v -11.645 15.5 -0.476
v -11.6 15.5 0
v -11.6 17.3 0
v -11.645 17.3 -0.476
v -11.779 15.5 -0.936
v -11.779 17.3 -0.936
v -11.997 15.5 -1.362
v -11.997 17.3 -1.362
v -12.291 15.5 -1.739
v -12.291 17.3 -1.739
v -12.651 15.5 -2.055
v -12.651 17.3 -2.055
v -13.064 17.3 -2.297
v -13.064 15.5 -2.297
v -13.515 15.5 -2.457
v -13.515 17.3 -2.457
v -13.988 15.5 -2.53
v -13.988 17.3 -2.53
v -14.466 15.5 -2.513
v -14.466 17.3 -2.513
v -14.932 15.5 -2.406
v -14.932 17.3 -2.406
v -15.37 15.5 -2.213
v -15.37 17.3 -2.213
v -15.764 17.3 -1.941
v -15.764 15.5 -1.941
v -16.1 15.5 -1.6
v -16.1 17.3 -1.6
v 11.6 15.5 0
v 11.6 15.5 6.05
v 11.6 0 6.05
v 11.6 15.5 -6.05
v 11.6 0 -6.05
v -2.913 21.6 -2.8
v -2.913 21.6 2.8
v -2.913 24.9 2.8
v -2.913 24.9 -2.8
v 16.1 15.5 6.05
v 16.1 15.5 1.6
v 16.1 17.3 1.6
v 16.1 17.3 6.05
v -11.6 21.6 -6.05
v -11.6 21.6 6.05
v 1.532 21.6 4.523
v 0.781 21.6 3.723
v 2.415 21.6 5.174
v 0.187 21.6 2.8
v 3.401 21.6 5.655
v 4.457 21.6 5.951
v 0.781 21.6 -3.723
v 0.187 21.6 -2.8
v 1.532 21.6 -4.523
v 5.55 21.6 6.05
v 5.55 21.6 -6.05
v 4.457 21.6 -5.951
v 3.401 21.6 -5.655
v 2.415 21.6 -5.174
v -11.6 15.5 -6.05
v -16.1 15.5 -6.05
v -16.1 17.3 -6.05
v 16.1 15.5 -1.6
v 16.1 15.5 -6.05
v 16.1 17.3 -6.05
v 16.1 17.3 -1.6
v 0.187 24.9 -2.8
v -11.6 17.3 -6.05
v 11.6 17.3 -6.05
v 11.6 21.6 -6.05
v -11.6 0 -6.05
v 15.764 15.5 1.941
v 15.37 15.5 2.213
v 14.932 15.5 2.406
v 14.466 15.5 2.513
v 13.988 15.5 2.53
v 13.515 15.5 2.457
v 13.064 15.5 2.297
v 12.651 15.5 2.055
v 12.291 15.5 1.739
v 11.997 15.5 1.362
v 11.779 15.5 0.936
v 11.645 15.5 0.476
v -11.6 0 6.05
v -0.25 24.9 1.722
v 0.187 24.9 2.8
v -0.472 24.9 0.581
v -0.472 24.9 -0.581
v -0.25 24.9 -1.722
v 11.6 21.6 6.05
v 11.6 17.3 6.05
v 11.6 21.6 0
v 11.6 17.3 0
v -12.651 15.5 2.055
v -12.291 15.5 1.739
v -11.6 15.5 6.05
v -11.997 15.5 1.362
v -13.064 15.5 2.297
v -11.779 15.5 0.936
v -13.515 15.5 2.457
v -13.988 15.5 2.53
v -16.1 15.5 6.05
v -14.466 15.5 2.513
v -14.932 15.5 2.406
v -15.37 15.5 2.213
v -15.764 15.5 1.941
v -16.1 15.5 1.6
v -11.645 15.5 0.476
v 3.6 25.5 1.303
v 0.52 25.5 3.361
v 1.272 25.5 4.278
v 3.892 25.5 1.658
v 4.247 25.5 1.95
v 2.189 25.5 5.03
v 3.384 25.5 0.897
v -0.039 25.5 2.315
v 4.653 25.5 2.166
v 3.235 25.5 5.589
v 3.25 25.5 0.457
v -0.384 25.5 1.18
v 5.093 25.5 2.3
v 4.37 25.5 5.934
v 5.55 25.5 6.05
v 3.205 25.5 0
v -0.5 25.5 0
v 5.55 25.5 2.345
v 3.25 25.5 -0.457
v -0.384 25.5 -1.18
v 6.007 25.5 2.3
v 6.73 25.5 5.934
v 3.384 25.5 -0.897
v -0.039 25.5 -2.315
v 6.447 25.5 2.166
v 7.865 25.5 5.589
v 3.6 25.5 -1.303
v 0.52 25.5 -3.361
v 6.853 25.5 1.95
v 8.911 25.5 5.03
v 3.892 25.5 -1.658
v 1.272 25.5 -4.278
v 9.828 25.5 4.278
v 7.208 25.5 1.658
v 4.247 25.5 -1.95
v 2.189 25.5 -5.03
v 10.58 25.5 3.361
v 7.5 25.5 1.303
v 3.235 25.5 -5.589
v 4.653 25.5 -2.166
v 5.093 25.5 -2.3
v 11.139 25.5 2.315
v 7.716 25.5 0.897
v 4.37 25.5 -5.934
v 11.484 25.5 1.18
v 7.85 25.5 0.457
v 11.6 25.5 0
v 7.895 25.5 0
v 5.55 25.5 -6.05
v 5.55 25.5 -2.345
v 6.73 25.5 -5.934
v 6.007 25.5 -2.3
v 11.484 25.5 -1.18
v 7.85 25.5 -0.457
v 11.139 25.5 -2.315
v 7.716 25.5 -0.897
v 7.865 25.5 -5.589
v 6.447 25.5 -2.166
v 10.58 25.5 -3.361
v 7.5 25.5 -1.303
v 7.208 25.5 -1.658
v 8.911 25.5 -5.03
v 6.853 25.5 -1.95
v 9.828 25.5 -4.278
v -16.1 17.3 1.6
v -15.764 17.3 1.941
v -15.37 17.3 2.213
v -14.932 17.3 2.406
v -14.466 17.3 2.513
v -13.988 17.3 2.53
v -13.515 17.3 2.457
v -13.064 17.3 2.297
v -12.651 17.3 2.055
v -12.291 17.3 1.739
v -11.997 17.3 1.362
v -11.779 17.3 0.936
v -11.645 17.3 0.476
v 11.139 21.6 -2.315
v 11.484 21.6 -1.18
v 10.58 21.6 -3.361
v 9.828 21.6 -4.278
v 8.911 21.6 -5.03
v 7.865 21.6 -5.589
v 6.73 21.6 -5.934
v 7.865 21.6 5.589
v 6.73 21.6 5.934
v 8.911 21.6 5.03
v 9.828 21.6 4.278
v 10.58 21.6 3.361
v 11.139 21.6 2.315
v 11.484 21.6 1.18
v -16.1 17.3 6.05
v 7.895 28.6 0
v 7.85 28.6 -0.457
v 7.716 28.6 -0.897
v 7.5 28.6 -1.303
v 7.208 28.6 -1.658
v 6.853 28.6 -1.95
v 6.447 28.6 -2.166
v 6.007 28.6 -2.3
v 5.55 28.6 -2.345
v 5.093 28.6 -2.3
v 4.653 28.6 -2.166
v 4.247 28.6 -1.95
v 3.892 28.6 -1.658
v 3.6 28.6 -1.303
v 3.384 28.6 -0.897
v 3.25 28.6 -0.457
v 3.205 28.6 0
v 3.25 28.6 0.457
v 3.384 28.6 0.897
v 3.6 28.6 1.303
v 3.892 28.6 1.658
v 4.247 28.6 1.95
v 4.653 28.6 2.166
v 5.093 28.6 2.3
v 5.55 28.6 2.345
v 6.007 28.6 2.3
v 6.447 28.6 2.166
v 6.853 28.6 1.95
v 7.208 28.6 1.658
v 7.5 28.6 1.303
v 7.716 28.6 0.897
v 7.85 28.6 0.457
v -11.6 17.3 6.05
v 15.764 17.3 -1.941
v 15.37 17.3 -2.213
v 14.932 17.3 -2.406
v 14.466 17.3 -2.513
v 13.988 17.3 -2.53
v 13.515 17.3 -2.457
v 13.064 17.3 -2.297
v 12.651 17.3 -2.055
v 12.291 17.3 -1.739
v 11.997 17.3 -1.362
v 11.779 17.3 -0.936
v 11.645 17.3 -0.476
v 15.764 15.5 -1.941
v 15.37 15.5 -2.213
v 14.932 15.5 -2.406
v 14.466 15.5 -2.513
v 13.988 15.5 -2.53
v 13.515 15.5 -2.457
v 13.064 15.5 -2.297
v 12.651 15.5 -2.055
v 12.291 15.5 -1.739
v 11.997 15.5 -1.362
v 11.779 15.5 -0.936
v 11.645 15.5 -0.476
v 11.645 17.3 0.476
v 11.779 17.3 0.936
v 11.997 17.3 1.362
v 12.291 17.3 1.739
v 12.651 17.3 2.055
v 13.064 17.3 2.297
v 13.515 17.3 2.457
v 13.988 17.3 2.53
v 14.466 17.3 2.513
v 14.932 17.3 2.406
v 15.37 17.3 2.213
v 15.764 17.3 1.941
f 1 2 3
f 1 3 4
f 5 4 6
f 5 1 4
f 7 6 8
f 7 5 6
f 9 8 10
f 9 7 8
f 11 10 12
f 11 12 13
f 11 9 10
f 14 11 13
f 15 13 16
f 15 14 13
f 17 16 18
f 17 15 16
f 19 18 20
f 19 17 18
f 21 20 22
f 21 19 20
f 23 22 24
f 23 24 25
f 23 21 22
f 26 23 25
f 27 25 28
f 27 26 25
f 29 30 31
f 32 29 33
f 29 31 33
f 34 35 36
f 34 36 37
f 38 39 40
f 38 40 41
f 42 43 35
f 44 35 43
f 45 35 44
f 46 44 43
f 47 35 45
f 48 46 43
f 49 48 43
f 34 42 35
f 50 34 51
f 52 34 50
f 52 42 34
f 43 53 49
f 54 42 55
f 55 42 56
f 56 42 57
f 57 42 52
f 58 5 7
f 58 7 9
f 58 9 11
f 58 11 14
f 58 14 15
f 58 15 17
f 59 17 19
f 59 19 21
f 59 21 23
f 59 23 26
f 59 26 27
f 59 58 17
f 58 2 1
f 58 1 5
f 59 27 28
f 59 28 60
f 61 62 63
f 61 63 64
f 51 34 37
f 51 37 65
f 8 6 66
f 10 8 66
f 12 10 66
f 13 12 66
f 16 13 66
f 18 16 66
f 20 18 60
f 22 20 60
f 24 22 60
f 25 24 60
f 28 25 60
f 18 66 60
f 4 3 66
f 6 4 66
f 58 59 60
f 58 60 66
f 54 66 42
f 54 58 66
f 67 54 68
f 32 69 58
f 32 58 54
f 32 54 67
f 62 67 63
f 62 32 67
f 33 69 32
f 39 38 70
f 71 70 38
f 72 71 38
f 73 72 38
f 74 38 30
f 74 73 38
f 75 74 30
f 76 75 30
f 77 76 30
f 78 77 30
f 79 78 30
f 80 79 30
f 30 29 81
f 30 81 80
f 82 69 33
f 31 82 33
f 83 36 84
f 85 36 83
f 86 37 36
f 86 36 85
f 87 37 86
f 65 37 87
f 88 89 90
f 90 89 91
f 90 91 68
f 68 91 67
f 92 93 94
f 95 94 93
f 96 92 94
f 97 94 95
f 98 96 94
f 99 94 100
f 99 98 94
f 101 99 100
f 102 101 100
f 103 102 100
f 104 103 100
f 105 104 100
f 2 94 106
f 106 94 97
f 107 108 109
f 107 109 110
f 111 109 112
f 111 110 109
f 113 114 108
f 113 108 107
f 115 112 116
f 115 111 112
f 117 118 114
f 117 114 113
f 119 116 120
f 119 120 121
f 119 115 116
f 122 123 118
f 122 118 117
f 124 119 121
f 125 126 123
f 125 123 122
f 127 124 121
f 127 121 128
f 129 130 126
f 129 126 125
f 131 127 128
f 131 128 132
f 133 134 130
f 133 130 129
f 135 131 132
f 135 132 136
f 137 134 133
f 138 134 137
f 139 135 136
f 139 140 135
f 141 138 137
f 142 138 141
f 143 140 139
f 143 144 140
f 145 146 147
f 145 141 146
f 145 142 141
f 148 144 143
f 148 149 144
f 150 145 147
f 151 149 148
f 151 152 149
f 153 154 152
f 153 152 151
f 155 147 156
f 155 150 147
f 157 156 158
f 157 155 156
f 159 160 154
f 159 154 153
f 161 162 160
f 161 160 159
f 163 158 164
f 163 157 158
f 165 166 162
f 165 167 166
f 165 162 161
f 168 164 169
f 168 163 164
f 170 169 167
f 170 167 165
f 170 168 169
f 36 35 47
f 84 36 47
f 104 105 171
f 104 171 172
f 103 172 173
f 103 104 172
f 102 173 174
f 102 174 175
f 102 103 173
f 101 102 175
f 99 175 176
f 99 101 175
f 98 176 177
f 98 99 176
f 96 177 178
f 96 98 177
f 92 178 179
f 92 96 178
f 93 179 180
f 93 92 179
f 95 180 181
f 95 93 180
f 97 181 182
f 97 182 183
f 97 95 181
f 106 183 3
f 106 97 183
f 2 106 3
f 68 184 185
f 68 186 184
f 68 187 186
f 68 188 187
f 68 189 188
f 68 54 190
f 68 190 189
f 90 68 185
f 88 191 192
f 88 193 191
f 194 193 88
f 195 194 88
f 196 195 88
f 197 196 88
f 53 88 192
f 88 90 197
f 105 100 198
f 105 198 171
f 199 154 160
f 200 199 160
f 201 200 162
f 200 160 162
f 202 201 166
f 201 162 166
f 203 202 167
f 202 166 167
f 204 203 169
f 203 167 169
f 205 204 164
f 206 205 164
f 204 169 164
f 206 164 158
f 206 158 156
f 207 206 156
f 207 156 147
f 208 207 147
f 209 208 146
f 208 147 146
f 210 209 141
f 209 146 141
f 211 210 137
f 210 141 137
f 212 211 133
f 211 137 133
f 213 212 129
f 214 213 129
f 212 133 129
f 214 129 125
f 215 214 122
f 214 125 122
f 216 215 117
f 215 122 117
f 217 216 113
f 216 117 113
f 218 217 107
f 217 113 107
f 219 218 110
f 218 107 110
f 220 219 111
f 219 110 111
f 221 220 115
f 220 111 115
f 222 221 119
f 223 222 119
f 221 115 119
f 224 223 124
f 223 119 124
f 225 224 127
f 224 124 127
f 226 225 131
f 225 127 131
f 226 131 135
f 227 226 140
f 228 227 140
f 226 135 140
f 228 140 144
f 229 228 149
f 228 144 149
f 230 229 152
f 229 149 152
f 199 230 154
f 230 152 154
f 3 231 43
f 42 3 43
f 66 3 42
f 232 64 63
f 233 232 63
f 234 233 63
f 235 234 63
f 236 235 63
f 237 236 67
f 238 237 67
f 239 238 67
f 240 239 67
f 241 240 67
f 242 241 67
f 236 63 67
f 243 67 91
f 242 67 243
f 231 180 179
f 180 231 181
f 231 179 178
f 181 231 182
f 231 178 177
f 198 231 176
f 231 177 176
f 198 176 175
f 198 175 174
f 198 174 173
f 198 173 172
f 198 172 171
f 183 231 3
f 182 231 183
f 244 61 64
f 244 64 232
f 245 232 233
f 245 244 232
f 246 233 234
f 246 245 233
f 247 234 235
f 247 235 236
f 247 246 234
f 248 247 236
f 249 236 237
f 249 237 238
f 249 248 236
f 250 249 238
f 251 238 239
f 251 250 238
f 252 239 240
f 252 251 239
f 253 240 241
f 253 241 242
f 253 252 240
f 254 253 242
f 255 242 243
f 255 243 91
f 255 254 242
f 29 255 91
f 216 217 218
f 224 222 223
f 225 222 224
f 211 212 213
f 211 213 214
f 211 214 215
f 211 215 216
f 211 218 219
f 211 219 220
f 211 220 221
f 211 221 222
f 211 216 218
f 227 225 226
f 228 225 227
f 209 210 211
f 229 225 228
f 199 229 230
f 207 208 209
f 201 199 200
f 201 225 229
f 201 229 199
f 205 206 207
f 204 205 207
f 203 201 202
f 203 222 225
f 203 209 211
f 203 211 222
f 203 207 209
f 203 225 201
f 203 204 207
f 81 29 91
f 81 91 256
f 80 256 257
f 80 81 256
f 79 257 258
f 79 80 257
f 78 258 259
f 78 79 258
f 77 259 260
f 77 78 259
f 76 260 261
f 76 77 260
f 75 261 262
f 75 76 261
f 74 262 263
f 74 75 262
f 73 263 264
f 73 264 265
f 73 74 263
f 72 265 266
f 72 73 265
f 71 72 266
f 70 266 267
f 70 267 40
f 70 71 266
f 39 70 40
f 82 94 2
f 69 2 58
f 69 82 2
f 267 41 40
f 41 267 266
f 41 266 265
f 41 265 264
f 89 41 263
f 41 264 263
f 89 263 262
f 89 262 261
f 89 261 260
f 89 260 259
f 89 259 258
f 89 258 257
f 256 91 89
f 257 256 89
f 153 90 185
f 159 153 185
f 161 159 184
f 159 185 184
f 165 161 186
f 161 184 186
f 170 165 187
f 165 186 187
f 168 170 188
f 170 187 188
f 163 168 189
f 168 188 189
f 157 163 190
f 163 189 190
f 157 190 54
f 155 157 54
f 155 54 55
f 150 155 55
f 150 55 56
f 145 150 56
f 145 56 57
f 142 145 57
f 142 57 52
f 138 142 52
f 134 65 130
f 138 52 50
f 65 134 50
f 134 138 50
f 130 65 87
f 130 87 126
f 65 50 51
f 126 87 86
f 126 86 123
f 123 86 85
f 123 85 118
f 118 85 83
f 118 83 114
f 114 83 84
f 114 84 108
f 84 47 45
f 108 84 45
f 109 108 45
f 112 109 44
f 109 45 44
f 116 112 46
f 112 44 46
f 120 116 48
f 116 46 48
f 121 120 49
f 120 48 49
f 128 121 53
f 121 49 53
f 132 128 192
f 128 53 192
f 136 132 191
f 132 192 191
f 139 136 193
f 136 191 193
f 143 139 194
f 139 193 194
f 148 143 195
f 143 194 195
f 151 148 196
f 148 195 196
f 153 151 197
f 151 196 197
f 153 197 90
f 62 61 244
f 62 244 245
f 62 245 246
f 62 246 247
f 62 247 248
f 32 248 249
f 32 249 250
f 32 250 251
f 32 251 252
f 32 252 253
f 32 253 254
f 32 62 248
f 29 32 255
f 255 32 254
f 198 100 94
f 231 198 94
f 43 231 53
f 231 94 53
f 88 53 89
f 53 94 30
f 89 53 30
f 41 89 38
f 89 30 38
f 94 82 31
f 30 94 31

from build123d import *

# Parameters (mm, degrees)
SKETCH1_W           = 23.2
SKETCH1_H           = 12.1
BOSS_EXTRUDE1_DEPTH = 21.6
BOSS_EXTRUDE2_DEPTH = 1.8
SKETCH5_R           = 6.05
BOSS_EXTRUDE3_DEPTH = 3.9
SKETCH6_R           = 2.345
BOSS_EXTRUDE4_DEPTH = 3.1
SKETCH7_W           = 3.926136304
SKETCH7_H           = 5.6
BOSS_EXTRUDE5_DEPTH = 3.3


with BuildPart() as part:
    # Sketch1 → Boss-Extrude1 (new body)
    with BuildSketch(Plane(origin=(0, 0, 0), x_dir=(1, 0, 0), z_dir=(0, 1, 0))):
        Rectangle(SKETCH1_W, SKETCH1_H)
    extrude(amount=BOSS_EXTRUDE1_DEPTH)

    # Sketch3 → Boss-Extrude2 (add)
    with BuildSketch(Plane(origin=(0, 15.5, 0), x_dir=(-1, 0, 0), z_dir=(0, -1, 0))):
        with BuildLine():
            Line((-11.6, 2.8e-08), (-11.6, 6.05))
            Line((-11.6, 6.05), (-16.1, 6.05))
            Line((-16.1, 6.05), (-16.1, 1.6))
            ThreePointArc((-16.1, 1.6), (-13.285381067, 2.387990792), (-11.6, 2.8e-08))
        make_face()
        with BuildLine():
            Line((-11.6, -6.05), (-11.6, 2.8e-08))
            ThreePointArc((-11.6, 2.8e-08), (-13.28538104, -2.387990782), (-16.1, -1.6))
            Line((-16.1, -1.6), (-16.1, -6.05))
            Line((-16.1, -6.05), (-11.6, -6.05))
        make_face()
        with BuildLine():
            ThreePointArc((16.1, -1.6), (13.285381054, -2.387990787), (11.6, -1e-09))
            Line((11.6, -1e-09), (11.6, -6.05))
            Line((11.6, -6.05), (16.1, -6.05))
            Line((16.1, -6.05), (16.1, -1.6))
        make_face()
        with BuildLine():
            Line((16.1, 1.6), (16.1, 6.05))
            Line((16.1, 6.05), (11.6, 6.05))
            Line((11.6, 6.05), (11.6, -1e-09))
            ThreePointArc((11.6, -1e-09), (13.285381053, 2.387990787), (16.1, 1.6))
        make_face()
    extrude(amount=-BOSS_EXTRUDE2_DEPTH)

    # Sketch5 → Boss-Extrude3 (add)
    with BuildSketch(Plane(origin=(0, 21.6, 0), x_dir=(1, 0, 0), z_dir=(0, 1, 0))):
        with Locations((5.55, 0)):
            Circle(SKETCH5_R)
    extrude(amount=BOSS_EXTRUDE3_DEPTH)

    # Sketch6 → Boss-Extrude4 (add)
    with BuildSketch(Plane(origin=(0, 25.5, 0), x_dir=(1, 0, 0), z_dir=(0, 1, 0))):
        with Locations((5.55, 0)):
            Circle(SKETCH6_R)
    extrude(amount=BOSS_EXTRUDE4_DEPTH)

    # Sketch7 → Boss-Extrude5 (add)
    with BuildSketch(Plane(origin=(0, 21.6, 0), x_dir=(1, 0, 0), z_dir=(0, 1, 0))):
        with Locations((-0.95, 0)):
            Rectangle(SKETCH7_W, SKETCH7_H)
    extrude(amount=BOSS_EXTRUDE5_DEPTH)


solid = part.part
